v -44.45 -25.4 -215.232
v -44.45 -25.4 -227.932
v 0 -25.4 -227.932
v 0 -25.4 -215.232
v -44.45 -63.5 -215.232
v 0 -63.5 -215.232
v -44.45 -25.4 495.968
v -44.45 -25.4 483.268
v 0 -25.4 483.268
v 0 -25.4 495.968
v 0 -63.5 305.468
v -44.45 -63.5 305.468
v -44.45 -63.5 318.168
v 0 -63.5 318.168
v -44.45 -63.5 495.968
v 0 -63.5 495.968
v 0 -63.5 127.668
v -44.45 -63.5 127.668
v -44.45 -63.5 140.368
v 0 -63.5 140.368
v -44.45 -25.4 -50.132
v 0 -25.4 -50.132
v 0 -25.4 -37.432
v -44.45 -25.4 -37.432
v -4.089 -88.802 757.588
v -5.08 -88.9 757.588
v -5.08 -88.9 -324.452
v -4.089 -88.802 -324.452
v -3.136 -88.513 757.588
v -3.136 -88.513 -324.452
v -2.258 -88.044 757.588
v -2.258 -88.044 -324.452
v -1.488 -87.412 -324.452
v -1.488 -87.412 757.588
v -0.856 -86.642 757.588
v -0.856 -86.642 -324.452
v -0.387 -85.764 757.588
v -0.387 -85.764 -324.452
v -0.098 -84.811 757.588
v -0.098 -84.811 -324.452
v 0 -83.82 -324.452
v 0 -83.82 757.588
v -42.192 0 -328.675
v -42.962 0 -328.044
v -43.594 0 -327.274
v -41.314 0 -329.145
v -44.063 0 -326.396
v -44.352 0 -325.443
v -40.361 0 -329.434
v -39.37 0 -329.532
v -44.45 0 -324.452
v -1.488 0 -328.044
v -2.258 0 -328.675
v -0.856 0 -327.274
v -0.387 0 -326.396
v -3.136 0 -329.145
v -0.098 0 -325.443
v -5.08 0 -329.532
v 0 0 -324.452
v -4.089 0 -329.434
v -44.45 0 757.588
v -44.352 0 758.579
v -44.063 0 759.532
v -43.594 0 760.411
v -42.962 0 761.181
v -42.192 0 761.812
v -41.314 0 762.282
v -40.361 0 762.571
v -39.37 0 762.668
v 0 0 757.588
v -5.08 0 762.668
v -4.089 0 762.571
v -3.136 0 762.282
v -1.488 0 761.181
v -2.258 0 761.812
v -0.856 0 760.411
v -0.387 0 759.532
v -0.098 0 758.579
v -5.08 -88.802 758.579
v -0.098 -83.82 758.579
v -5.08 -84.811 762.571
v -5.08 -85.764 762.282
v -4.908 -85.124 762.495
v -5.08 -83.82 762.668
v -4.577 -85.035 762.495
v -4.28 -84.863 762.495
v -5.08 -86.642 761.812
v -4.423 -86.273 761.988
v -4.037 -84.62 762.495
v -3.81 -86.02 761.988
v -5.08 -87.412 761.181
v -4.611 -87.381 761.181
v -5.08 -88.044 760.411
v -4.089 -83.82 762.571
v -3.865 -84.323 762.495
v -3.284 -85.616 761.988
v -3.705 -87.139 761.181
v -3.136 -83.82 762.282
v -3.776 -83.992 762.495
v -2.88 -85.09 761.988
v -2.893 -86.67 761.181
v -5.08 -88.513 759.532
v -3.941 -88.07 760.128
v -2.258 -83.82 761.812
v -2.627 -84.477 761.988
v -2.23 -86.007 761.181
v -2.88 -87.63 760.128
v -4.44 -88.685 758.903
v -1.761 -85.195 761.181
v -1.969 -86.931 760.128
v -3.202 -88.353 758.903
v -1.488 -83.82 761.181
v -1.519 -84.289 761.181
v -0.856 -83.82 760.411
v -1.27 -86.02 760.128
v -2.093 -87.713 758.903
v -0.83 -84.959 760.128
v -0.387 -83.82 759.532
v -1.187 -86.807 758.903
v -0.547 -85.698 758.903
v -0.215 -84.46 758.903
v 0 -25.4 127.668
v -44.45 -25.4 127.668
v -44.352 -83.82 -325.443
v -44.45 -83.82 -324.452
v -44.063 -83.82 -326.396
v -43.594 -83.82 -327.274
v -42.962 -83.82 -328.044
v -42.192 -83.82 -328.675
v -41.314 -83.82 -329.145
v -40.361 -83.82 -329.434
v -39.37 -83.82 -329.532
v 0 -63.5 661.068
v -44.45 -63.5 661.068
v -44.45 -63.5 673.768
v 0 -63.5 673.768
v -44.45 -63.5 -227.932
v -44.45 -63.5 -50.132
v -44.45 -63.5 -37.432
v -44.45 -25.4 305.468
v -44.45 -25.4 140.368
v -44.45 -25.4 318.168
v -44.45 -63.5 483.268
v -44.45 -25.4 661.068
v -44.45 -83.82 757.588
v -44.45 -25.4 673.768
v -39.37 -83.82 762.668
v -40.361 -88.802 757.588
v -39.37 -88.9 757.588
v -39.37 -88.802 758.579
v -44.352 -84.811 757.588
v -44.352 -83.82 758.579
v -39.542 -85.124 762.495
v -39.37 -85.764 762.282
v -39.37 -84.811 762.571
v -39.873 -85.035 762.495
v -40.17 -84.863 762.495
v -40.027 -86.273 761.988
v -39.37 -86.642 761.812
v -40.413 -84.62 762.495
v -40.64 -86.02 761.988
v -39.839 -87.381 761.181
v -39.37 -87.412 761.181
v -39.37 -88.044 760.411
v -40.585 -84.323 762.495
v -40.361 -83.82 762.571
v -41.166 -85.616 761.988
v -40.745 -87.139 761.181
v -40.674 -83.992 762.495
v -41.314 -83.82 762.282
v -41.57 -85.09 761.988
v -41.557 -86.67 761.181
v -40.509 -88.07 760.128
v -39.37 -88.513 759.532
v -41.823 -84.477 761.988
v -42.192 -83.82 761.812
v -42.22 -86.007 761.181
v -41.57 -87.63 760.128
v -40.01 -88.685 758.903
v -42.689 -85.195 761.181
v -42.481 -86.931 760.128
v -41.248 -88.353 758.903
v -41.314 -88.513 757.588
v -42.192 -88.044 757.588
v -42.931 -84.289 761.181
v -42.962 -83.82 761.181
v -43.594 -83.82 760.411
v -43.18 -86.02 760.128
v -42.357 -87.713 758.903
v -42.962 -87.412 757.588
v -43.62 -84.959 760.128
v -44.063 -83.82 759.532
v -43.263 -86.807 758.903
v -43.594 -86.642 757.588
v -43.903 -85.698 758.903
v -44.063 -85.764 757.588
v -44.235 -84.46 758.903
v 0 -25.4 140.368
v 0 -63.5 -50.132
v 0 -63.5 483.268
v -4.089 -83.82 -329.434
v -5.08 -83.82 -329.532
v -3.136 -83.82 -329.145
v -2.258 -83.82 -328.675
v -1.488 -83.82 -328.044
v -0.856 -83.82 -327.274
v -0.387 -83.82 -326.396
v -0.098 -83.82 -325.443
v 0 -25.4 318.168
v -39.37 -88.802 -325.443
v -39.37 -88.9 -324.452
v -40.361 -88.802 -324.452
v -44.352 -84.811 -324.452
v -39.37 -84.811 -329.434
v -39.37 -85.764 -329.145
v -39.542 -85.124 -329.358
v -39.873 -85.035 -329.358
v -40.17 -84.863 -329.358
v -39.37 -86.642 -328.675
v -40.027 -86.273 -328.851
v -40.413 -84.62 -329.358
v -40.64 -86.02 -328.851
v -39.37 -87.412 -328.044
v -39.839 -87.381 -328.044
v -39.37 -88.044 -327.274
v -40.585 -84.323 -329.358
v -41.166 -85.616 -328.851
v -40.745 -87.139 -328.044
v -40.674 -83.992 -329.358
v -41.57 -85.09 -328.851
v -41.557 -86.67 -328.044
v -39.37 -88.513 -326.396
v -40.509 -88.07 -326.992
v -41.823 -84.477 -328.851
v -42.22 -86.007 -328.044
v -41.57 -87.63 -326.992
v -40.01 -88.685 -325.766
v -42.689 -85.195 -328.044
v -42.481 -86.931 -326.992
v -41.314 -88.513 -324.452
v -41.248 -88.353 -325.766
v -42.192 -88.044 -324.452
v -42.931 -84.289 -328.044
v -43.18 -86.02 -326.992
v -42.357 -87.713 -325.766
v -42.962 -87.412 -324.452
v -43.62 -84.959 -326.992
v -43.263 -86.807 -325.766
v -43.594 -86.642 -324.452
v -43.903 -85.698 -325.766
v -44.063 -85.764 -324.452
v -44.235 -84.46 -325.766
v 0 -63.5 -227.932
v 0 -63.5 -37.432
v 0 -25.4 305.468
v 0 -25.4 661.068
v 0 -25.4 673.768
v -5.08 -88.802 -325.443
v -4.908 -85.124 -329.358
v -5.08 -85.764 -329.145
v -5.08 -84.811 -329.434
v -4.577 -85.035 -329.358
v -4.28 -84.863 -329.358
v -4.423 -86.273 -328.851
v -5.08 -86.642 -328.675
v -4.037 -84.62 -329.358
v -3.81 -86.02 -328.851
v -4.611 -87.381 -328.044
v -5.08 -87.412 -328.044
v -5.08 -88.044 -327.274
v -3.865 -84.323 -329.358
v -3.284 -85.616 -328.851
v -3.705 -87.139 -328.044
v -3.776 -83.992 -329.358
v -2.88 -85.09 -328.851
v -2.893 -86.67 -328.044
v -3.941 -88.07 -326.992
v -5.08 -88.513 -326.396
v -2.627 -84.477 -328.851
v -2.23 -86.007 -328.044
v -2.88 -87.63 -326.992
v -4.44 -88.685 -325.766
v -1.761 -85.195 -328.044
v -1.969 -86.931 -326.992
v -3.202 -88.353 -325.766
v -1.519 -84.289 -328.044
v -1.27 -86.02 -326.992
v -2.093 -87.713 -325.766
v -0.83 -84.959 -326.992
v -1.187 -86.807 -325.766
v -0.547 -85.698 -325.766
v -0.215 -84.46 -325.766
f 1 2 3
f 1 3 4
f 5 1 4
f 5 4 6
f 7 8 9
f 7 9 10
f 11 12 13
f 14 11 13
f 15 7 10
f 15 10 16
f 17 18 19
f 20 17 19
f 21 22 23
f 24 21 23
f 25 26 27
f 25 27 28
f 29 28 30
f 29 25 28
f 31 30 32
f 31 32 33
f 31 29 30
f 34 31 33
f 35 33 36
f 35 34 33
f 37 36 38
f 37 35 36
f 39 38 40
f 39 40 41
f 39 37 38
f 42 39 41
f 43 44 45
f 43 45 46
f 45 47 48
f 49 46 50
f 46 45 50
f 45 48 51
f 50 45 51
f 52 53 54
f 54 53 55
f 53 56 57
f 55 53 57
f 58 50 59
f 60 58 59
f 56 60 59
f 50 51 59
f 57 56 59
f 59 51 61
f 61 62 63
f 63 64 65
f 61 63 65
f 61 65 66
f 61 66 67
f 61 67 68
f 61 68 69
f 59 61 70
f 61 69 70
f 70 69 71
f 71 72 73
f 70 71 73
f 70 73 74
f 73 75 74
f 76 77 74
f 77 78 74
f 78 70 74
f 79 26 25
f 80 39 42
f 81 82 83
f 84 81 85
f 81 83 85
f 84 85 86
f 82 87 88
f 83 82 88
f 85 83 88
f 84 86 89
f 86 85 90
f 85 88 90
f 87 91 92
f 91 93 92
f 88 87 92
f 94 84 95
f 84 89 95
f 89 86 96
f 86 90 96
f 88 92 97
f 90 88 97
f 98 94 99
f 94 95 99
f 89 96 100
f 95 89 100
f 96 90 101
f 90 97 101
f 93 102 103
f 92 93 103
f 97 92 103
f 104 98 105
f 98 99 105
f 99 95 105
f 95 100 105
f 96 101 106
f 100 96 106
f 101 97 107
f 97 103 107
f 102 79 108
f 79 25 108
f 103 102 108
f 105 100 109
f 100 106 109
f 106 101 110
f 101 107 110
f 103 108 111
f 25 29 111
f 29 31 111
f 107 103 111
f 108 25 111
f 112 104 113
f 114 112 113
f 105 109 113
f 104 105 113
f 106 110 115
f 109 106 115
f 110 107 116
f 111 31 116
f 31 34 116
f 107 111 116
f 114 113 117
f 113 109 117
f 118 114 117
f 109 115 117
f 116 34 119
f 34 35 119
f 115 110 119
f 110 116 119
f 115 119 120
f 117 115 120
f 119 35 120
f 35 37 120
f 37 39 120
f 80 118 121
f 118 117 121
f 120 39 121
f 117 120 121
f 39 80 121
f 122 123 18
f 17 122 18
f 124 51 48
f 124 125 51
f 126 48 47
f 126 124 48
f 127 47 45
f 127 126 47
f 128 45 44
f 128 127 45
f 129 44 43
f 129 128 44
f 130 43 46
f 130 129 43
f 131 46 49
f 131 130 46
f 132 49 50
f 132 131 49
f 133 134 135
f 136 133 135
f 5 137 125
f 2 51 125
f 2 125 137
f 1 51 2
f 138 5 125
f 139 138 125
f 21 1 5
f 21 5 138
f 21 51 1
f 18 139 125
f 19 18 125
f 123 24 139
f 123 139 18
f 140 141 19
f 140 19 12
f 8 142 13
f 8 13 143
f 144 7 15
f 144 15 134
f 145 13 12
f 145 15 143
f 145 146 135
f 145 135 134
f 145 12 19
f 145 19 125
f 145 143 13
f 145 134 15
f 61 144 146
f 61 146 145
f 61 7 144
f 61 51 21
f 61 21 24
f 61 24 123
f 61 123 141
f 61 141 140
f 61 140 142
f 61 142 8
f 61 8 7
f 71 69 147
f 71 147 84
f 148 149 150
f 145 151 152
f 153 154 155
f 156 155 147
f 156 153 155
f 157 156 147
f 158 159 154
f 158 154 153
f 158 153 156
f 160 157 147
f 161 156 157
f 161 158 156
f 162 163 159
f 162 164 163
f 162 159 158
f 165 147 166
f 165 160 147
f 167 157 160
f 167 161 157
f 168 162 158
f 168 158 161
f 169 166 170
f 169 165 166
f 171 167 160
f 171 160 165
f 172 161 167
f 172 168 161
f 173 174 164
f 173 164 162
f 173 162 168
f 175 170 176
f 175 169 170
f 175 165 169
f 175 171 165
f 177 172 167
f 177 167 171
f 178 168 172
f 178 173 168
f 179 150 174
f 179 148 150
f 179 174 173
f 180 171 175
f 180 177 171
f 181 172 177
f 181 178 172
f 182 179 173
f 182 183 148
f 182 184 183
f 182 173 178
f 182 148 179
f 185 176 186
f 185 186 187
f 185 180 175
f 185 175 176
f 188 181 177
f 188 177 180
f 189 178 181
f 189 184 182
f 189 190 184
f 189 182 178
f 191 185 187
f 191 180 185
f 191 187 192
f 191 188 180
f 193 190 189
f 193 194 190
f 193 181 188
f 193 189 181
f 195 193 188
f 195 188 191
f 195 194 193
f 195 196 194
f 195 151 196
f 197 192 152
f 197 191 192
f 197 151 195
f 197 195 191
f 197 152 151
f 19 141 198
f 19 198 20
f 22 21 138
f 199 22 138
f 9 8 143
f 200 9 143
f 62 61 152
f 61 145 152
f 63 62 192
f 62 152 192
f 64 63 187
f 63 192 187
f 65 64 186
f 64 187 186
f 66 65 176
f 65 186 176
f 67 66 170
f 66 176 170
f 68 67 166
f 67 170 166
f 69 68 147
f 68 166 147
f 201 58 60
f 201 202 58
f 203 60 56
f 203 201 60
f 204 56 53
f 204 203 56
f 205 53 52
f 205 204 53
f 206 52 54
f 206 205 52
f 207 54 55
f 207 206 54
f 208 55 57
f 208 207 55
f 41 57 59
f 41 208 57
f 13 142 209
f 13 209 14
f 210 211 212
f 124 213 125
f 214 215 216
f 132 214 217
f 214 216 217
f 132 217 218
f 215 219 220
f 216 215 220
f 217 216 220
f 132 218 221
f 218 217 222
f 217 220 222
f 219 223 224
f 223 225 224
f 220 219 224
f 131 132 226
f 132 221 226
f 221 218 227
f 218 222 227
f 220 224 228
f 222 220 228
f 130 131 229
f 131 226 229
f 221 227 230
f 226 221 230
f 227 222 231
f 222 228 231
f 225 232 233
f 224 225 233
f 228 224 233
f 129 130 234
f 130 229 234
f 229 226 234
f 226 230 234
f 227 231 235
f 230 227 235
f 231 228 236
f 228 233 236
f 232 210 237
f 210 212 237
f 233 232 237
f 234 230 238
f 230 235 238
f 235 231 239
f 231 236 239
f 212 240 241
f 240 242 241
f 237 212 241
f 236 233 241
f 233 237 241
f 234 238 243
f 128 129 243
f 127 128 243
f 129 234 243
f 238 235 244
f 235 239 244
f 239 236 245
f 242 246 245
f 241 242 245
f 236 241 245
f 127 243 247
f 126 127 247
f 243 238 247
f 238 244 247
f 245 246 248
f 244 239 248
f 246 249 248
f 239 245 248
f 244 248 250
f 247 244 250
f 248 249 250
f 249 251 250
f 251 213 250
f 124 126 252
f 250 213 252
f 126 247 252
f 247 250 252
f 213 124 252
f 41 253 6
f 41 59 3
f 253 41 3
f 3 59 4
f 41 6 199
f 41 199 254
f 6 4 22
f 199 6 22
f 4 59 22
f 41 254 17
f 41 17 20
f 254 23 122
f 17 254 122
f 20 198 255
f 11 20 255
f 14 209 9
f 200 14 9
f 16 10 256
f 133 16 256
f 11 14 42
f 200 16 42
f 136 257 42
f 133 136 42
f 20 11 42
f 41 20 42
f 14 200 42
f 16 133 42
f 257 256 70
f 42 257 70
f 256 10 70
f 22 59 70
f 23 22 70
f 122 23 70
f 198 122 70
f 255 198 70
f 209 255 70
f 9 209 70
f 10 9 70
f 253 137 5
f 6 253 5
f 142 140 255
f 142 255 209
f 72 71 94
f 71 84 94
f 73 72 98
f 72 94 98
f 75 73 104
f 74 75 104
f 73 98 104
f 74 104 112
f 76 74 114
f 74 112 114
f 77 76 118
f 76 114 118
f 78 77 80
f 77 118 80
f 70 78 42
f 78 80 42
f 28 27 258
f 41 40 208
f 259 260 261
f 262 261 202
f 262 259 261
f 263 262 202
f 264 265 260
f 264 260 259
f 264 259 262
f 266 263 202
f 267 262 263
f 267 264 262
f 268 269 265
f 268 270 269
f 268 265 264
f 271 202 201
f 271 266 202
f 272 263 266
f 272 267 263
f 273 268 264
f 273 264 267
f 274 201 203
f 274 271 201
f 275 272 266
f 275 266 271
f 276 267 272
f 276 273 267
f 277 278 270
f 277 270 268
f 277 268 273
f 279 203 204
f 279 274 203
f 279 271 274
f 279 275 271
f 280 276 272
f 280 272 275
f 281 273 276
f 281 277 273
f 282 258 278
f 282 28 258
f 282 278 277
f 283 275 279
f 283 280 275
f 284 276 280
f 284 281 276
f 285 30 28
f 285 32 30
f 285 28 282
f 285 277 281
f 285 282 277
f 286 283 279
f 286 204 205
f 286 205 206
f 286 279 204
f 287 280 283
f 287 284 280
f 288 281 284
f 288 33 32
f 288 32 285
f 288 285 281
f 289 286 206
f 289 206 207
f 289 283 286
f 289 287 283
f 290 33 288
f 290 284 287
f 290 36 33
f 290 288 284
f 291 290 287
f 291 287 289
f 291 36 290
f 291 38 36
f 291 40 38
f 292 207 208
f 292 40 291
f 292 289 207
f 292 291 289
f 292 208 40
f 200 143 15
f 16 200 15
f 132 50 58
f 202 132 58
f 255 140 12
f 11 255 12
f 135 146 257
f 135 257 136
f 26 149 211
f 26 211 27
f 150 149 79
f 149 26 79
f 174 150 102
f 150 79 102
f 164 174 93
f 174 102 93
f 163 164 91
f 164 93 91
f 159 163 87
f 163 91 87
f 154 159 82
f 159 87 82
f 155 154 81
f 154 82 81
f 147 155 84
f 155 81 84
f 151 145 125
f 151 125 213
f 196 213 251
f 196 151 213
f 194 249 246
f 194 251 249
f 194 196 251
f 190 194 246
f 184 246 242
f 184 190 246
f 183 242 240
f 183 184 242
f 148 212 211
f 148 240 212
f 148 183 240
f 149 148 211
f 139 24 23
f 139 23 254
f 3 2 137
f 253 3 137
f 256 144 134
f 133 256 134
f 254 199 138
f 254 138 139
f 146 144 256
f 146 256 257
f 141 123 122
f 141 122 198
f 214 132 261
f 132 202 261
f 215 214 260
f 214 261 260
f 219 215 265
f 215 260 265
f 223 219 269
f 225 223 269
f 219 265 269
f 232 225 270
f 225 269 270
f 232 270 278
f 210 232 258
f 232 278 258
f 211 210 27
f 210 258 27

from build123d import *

# Parameters (mm, degrees)
F0_W     = 44.45
F0_H     = 1092.2
F1_DEPTH = 88.9
F2_W     = 38.1
F2_H     = 12.7
F3_DEPTH = 44.451
F4_R     = 5.08


with BuildPart() as f1:
    # F0 (on Front) → F1 (new body)
    with BuildSketch(Plane.XZ):
        with Locations((-22.225, 216.568415)):
            Rectangle(F0_W, F0_H)
    extrude(amount=F1_DEPTH)

    # F2 (on face) → F3 (cut, through all)
    with BuildSketch(Plane(origin=(-44.45, 0, 0), x_dir=(0, -1, 0), z_dir=(-1, 0, 0))):
        with Locations((44.45, 667.418415)):
            Rectangle(F2_W, F2_H)
        with Locations((44.45, -43.781585)):
            Rectangle(F2_W, F2_H)
        with Locations((44.45, 134.018415)):
            Rectangle(F2_W, F2_H)
        with Locations((44.45, 311.818415)):
            Rectangle(F2_W, F2_H)
        with Locations((44.45, -221.581585)):
            Rectangle(F2_W, F2_H)
        with Locations((44.45, 489.618415)):
            Rectangle(F2_W, F2_H)
    extrude(amount=-F3_DEPTH, mode=Mode.SUBTRACT)

    # F4
    f4_edges = [f1.edges().sort_by_distance(p)[0] for p in [
        (-44.45, -88.9, 216.568415),
        (0, -88.9, 216.568415),
        (-22.225, -88.9, 762.668415),
        (0, -44.45, 762.668415),
        (-44.45, -44.45, 762.668415),
        (-22.225, -88.9, -329.531585),
        (0, -44.45, -329.531585),
        (-44.45, -44.45, -329.531585),
    ]]
    fillet(f4_edges, radius=F4_R)


solid = f1.part
